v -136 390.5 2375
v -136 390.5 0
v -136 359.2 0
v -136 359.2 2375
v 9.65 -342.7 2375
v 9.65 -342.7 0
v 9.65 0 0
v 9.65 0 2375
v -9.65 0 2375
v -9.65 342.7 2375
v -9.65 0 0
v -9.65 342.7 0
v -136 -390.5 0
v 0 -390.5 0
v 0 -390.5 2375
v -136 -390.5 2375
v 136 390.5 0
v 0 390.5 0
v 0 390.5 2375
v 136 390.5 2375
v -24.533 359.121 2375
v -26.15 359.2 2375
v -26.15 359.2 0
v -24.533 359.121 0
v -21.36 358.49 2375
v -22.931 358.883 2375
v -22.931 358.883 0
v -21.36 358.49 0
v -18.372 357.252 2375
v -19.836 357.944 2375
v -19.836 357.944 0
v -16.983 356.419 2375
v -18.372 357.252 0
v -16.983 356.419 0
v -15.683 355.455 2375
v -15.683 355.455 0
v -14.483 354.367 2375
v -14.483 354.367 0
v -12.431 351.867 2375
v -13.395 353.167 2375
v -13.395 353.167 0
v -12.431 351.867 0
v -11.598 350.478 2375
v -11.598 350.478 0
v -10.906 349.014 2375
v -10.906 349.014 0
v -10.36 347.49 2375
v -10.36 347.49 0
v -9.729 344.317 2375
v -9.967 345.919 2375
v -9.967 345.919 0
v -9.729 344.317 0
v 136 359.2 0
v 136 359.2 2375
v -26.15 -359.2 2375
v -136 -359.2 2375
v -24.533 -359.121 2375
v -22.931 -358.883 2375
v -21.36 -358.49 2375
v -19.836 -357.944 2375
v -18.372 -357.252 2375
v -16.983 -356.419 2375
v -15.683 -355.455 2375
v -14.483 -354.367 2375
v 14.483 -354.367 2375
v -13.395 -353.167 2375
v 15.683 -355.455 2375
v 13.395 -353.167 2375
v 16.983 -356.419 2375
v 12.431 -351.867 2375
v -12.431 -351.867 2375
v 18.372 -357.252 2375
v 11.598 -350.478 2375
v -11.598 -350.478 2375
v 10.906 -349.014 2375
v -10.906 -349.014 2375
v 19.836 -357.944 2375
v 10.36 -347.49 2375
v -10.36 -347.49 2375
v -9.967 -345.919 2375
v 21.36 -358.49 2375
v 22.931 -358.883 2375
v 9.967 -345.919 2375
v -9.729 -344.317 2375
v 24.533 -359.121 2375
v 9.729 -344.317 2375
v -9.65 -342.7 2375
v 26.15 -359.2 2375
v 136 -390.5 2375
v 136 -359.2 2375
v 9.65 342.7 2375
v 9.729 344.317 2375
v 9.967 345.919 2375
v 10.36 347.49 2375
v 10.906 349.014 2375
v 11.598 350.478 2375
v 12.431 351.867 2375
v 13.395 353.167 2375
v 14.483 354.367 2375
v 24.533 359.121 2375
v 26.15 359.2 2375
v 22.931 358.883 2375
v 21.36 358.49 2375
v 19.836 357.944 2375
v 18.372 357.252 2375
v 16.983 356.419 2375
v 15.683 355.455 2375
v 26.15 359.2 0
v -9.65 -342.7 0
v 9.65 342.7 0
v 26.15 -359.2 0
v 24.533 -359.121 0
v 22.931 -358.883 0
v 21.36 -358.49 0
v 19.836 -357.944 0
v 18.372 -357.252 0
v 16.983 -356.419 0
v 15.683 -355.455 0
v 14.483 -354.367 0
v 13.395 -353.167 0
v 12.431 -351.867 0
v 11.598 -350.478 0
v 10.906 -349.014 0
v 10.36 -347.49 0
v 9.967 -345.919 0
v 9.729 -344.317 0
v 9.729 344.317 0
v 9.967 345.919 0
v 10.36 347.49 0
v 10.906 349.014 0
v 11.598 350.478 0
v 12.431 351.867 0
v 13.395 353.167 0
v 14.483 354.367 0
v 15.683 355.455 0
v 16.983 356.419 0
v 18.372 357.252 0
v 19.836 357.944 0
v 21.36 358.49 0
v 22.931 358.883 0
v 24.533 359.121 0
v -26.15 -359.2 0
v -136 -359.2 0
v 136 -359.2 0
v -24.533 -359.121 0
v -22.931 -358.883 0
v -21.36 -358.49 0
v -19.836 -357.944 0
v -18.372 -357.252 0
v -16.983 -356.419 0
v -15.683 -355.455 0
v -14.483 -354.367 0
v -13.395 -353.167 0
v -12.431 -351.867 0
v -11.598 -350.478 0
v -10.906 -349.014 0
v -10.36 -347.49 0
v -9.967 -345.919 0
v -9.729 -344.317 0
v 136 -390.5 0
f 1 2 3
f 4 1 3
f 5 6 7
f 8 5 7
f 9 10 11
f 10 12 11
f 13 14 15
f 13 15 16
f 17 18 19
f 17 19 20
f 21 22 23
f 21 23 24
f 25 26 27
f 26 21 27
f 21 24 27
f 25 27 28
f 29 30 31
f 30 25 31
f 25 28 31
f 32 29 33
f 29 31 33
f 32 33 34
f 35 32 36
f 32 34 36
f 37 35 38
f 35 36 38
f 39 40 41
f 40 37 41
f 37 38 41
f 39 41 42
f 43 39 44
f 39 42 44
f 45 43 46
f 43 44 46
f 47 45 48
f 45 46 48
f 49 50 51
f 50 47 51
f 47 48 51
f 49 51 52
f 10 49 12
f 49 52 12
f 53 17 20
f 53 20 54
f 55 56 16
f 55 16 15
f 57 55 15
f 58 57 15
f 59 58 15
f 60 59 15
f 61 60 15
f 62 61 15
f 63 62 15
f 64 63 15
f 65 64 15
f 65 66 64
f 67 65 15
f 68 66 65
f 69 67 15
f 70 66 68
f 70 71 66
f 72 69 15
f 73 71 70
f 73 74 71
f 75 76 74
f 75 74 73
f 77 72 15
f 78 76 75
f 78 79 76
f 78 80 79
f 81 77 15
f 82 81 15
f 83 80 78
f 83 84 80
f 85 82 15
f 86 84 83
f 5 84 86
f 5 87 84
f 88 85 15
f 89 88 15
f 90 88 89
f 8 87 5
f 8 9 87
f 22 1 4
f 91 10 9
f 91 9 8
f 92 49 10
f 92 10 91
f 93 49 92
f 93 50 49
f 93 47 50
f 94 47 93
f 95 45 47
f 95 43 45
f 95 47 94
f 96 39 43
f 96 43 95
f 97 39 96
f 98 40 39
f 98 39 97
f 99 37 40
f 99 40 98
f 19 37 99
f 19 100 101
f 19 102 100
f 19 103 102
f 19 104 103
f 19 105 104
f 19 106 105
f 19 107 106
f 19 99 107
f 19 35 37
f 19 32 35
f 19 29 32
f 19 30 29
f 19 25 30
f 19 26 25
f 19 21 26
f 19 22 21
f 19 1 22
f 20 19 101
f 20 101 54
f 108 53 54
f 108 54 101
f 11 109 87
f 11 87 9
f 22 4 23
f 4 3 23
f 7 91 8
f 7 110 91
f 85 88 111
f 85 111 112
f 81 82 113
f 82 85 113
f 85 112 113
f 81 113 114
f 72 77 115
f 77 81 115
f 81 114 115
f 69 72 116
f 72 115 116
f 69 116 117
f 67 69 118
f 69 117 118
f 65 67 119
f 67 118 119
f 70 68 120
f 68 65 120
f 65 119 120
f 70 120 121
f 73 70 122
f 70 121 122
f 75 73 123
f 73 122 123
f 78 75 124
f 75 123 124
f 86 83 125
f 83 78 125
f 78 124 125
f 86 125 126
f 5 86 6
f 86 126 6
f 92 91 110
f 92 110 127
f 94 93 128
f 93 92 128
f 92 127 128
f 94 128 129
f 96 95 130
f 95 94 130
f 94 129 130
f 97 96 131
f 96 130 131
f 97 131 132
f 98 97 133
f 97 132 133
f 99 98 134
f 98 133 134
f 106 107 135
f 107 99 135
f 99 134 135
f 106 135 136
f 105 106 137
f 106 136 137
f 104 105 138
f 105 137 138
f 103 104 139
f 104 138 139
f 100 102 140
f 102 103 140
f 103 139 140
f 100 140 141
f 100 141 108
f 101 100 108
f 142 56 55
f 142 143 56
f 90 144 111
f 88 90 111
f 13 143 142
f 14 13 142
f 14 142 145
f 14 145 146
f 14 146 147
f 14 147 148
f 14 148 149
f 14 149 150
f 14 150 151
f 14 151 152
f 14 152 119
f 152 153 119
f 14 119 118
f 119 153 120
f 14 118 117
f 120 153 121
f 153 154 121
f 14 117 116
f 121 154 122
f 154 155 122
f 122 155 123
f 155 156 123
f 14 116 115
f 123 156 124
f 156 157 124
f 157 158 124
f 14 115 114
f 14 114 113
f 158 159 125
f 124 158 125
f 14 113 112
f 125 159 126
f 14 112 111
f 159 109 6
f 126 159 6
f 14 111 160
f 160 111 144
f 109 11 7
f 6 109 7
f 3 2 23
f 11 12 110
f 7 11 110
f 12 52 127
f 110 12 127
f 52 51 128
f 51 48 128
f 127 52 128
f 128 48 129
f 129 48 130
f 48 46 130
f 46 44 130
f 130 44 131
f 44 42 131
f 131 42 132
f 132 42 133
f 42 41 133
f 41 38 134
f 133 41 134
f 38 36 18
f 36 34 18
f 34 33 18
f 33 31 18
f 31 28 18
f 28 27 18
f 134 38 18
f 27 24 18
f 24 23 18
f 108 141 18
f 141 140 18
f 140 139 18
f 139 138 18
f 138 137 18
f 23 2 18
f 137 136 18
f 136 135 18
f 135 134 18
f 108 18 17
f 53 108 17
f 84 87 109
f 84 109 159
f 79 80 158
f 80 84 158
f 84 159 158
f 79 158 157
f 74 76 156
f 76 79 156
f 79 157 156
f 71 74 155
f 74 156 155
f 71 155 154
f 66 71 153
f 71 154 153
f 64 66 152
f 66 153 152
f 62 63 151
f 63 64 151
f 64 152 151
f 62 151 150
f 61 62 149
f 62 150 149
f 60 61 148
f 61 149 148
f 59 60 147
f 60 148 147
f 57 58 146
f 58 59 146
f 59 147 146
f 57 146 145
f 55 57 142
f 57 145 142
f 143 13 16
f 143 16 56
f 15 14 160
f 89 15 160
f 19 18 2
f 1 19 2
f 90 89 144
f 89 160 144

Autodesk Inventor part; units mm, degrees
ref_plane "YZ Plane" through (0, 0, 0) normal (1, 0, 0) x (0, 1, 0)
ref_plane "Start plane" through (0, 0, 0) normal (0, 0, 1) x (1, 0, 0)
ref_plane "End plane" through (0, 0, 2375) normal (0, 0, 1) x (1, 0, 0)
sketch "Sketch" plane through (0, 0, 0) normal (0, 0, 1) x (1, 0, 0)
  line L0 (-136, -390.5) -> (-136, -359.2)
  line L1 (-136, -359.2) -> (-26.15, -359.2)
  line L2 (-9.65, -342.7) -> (-9.65, 0)
  line L3 (-9.65, 0) -> (0, 0) construction
  line L4 (0, 0) -> (0, -390.5) construction
  line L5 (0, -390.5) -> (-136, -390.5)
  line L6 (-60, 0) -> (80, 0) construction
  line L7 (0, -60) -> (0, 80) construction
  line L8 (136, -390.5) -> (136, -359.2)
  line L9 (136, -359.2) -> (26.15, -359.2)
  line L10 (9.65, -342.7) -> (9.65, 0)
  line L11 (9.65, 0) -> (0, 0) construction
  line L12 (0, -390.5) -> (136, -390.5)
  line L13 (-136, 390.5) -> (-136, 359.2)
  line L14 (-136, 359.2) -> (-26.15, 359.2)
  line L15 (-9.65, 342.7) -> (-9.65, 0)
  line L16 (0, 390.5) -> (-136, 390.5)
  line L17 (136, 390.5) -> (136, 359.2)
  line L18 (136, 359.2) -> (26.15, 359.2)
  line L19 (0, 390.5) -> (136, 390.5)
  line L20 (9.65, 342.7) -> (9.65, 0)
  arc A0 (-9.65, 342.7) -> (-26.15, 359.2) centre (-26.15, 342.7) ccw
  arc A1 (26.15, 359.2) -> (9.65, 342.7) centre (26.15, 342.7) ccw
  arc A2 (9.65, -342.7) -> (26.15, -359.2) centre (26.15, -342.7) ccw
  arc A3 (-26.15, -359.2) -> (-9.65, -342.7) centre (-26.15, -342.7) ccw
  line L21 (0, 108) -> (0, -88) construction
  line L22 (-88, 0) -> (108, 0) construction
  point P0 (-9.65, -359.2)
  point P1 (9.65, -359.2)
  point P2 (-9.65, 359.2)
  point P3 (9.65, 359.2)
  dimension "d1" = 390.5
  dimension "d2" = 31.3
  dimension "d3" = 136
  dimension "d4" = 9.65
  dimension "d10" = 16.5
extrude "Body" add sketch "Sketch" along normal up to surface (2375 mm away) from surface at 0
sketch "Sketch4" plane through (0, 0, 0) normal (0, 0, 1) x (1, 0, 0)
  line L0 (0, 0) -> (10, 0)
ref_plane "Work Plane3" through (0, 0, 0) normal (0, -1, 0) x (1, 0, 0)
sketch "Sketch5" plane through (0, 0, 0) normal (0, -1, 0) x (1, 0, 0)
  line L0 (-2, 0) -> (12, 0) projected
  line L1 (-2, 2375) -> (12, 2375) projected
  dimension "d14" = 2375
equation "\"d1\" = 0.5 * G_H"
equation "\"d2\" = G_T1"
equation "\"d3\" = 0.5 * G_W"
equation "\"d4\" = 0.5 * G_T"
equation "\"d10\" = G_IR"
equation "\"d5\" = G_L"
equation "\"G_W\" = 272"
equation "\"G_H\" = 781"
equation "\"G_T\" = 19.3"
equation "\"G_T1\" = 31.3"
equation "\"G_IR\" = 16.5"
equation "\"G_L\" = d14"
equation "\"G_OFFSET_START\" = 0"
equation "\"G_OFFSET_END\" = 0"
equation "\"d12\" = G_OFFSET_END + B_L"
equation "\"B_L\" = 2375"
properties part number "AS 3679-1990 - 760 UB - 244 - 2375" material "Steel, Mild"
